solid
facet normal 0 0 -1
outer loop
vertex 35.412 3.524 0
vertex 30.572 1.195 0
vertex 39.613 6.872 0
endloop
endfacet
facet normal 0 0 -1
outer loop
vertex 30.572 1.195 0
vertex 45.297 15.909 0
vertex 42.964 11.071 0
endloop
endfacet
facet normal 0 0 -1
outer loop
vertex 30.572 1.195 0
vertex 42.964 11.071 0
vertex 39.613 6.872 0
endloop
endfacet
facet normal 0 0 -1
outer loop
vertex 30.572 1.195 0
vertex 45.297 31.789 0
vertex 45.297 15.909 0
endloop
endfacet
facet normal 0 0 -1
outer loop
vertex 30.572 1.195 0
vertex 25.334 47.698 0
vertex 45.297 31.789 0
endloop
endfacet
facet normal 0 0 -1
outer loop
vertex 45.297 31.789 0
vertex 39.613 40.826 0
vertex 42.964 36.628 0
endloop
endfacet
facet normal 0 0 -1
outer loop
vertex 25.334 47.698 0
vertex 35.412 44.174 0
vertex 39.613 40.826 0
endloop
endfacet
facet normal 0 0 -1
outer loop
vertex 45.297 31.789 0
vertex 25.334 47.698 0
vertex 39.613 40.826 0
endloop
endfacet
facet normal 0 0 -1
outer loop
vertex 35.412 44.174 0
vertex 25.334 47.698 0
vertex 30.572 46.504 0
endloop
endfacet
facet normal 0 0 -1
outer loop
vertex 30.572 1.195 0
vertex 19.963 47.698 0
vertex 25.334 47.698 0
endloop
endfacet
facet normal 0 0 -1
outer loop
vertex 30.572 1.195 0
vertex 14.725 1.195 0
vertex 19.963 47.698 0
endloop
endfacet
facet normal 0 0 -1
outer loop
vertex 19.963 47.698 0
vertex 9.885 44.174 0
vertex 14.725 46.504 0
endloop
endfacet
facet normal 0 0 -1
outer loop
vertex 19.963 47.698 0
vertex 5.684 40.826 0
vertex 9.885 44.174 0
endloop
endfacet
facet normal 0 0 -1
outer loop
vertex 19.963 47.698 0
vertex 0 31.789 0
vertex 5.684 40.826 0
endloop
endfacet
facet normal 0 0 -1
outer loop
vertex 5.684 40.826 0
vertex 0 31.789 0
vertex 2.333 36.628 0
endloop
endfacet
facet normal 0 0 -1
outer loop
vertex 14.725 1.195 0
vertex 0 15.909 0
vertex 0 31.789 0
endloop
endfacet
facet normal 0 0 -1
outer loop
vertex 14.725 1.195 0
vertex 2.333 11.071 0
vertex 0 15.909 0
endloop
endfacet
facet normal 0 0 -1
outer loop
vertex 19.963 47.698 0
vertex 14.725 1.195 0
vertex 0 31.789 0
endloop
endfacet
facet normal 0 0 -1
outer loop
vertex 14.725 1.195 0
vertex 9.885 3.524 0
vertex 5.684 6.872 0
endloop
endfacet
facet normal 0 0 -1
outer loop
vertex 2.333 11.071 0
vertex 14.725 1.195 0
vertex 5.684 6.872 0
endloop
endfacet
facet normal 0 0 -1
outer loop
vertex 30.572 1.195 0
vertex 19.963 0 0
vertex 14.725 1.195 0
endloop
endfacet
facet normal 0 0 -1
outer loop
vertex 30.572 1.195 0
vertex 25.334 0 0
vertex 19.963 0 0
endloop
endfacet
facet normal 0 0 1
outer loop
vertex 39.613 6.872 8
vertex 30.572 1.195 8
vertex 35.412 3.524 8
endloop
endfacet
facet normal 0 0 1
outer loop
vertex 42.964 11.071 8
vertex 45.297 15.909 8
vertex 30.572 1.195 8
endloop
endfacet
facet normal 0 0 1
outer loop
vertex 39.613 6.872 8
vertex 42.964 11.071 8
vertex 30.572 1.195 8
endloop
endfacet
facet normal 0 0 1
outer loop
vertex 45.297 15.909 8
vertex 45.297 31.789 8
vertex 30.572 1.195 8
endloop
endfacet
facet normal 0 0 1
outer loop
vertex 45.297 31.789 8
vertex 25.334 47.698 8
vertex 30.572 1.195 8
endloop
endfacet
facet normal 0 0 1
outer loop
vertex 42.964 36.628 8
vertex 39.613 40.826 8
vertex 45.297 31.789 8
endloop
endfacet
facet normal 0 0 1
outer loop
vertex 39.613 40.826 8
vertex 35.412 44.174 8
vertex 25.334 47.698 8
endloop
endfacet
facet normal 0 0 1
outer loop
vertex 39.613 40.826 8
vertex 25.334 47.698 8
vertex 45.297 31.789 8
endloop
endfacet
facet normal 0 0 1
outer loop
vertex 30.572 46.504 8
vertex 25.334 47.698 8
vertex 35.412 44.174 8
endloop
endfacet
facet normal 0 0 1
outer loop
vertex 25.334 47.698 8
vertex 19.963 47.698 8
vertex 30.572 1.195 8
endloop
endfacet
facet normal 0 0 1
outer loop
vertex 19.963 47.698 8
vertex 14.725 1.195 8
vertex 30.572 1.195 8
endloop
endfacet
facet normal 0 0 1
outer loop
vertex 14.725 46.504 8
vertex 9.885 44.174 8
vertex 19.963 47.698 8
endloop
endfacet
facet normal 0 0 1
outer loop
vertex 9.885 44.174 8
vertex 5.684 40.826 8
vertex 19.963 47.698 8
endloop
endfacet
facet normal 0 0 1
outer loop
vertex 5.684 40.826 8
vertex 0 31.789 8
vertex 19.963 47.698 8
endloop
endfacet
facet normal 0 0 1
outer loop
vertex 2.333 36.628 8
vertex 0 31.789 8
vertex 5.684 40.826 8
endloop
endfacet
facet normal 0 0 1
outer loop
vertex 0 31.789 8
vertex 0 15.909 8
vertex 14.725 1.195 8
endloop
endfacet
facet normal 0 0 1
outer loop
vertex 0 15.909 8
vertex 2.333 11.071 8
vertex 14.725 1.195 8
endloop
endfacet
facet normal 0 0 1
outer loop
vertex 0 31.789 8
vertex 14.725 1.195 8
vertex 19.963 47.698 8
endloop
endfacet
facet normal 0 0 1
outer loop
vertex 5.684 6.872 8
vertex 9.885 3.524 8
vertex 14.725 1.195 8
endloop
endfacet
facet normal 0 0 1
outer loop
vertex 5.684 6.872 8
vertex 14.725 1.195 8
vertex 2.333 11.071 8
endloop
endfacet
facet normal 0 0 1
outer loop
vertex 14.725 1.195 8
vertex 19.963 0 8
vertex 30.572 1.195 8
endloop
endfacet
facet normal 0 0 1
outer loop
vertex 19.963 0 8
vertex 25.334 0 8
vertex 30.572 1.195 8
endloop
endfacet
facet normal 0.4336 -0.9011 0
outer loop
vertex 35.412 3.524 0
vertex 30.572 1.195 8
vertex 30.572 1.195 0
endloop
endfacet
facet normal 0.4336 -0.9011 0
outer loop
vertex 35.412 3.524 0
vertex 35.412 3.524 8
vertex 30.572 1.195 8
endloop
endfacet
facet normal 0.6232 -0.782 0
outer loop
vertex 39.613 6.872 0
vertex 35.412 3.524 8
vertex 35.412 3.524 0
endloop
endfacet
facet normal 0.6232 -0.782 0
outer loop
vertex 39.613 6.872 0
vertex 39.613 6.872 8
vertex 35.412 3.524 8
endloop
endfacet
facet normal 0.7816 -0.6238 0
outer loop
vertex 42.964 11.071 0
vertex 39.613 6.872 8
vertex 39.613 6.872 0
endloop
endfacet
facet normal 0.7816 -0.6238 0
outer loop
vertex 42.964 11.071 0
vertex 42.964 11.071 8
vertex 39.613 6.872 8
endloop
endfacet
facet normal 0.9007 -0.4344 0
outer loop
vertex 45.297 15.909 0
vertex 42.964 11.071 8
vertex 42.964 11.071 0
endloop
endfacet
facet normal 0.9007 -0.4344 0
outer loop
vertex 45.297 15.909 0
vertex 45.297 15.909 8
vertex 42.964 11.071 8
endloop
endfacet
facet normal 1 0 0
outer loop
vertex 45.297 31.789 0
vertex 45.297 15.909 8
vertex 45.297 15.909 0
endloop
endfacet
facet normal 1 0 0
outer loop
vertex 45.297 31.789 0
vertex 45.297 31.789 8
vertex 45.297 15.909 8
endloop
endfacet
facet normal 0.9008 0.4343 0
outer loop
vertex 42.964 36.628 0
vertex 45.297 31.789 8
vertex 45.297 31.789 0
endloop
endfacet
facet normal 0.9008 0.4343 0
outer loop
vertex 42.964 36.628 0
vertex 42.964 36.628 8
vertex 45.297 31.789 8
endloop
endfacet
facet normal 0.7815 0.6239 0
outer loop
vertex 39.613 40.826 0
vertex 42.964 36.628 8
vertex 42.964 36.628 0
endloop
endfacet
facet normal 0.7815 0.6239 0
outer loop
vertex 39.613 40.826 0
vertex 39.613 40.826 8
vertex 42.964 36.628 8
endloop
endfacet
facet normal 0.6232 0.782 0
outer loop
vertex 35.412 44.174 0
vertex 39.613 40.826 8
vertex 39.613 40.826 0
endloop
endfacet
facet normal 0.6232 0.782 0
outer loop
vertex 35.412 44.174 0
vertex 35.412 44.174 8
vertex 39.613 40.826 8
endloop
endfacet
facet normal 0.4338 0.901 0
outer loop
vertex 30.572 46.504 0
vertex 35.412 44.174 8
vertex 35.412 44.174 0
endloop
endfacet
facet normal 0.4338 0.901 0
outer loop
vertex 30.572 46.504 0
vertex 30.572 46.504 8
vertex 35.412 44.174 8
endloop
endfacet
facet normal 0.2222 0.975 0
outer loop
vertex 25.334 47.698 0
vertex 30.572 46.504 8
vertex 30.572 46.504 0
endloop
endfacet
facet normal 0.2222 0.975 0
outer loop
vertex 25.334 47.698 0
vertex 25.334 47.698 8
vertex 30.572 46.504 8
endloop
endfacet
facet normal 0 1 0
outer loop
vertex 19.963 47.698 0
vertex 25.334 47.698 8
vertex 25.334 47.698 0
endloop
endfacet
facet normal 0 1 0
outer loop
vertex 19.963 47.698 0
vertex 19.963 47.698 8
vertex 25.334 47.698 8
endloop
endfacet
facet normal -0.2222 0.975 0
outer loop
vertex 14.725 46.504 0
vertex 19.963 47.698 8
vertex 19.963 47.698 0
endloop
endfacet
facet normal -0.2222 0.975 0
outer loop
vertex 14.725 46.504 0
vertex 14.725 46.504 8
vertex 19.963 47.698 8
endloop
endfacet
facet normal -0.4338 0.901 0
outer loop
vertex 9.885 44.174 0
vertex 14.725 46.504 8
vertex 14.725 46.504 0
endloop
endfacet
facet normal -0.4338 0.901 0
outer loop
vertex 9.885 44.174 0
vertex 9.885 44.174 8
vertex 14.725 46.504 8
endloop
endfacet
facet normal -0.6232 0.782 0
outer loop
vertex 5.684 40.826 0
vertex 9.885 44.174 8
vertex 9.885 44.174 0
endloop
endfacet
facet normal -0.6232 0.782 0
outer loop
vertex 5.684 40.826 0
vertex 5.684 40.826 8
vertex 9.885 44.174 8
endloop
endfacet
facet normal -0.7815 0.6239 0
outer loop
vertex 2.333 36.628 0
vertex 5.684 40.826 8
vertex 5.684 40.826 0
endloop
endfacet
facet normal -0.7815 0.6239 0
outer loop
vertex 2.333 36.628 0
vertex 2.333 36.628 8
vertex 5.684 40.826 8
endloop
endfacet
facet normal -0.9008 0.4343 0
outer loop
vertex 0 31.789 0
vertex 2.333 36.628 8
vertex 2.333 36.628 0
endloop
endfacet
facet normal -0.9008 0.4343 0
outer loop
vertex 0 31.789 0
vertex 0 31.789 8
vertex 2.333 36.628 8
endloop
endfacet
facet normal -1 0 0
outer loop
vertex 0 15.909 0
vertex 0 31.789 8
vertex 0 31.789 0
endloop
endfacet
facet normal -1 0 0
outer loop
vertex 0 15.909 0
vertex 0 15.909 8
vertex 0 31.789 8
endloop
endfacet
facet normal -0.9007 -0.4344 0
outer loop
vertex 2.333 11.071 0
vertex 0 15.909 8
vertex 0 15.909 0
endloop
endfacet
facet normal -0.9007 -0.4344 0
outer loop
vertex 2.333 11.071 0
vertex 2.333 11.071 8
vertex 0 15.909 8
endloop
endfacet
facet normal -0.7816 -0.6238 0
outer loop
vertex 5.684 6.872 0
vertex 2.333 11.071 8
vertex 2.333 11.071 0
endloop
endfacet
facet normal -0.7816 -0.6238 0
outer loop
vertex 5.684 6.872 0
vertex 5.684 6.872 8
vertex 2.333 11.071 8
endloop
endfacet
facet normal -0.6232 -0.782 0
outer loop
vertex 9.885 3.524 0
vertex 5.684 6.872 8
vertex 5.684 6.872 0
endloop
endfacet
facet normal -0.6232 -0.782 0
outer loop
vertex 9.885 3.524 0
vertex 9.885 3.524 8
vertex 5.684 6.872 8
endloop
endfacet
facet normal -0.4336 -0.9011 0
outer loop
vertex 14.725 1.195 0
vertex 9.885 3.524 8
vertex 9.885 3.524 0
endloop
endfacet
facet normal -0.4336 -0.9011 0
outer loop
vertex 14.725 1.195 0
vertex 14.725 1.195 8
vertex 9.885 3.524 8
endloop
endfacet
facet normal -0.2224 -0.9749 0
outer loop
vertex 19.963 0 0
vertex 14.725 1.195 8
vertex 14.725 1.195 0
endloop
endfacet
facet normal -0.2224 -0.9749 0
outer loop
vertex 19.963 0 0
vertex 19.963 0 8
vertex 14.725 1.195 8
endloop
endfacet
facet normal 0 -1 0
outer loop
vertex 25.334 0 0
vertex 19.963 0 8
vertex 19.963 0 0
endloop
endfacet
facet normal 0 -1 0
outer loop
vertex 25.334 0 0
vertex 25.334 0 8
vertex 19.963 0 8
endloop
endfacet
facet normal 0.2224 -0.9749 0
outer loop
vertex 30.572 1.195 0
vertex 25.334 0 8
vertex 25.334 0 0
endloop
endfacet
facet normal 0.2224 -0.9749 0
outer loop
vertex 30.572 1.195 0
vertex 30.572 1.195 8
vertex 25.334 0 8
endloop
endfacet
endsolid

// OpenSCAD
$fn = 32;

// ----------------------------------------------------------------------
// Flat adaptor: double_d, 8 mm thick
// ----------------------------------------------------------------------

// --- parameters (mm) ---
profile_height = 8;       // extrusion height
profile_points = 24;      // points of the closed outline

profile = [[45.297, 31.789], [42.964, 36.628], [39.613, 40.826], [35.412, 44.174], [30.572, 46.504], [25.334, 47.698], [19.963, 47.698], [14.725, 46.504], [9.885, 44.174], [5.684, 40.826], [2.333, 36.628], [0, 31.789], [0, 15.909], [2.333, 11.071], [5.684, 6.872], [9.885, 3.524], [14.725, 1.195], [19.963, 0], [25.334, 0], [30.572, 1.195], [35.412, 3.524], [39.613, 6.872], [42.964, 11.071], [45.297, 15.909]];  // single closed polygon, 24 points, counter clockwise

// --- the one profile operation ---
linear_extrude(height = profile_height) polygon(points = profile);
